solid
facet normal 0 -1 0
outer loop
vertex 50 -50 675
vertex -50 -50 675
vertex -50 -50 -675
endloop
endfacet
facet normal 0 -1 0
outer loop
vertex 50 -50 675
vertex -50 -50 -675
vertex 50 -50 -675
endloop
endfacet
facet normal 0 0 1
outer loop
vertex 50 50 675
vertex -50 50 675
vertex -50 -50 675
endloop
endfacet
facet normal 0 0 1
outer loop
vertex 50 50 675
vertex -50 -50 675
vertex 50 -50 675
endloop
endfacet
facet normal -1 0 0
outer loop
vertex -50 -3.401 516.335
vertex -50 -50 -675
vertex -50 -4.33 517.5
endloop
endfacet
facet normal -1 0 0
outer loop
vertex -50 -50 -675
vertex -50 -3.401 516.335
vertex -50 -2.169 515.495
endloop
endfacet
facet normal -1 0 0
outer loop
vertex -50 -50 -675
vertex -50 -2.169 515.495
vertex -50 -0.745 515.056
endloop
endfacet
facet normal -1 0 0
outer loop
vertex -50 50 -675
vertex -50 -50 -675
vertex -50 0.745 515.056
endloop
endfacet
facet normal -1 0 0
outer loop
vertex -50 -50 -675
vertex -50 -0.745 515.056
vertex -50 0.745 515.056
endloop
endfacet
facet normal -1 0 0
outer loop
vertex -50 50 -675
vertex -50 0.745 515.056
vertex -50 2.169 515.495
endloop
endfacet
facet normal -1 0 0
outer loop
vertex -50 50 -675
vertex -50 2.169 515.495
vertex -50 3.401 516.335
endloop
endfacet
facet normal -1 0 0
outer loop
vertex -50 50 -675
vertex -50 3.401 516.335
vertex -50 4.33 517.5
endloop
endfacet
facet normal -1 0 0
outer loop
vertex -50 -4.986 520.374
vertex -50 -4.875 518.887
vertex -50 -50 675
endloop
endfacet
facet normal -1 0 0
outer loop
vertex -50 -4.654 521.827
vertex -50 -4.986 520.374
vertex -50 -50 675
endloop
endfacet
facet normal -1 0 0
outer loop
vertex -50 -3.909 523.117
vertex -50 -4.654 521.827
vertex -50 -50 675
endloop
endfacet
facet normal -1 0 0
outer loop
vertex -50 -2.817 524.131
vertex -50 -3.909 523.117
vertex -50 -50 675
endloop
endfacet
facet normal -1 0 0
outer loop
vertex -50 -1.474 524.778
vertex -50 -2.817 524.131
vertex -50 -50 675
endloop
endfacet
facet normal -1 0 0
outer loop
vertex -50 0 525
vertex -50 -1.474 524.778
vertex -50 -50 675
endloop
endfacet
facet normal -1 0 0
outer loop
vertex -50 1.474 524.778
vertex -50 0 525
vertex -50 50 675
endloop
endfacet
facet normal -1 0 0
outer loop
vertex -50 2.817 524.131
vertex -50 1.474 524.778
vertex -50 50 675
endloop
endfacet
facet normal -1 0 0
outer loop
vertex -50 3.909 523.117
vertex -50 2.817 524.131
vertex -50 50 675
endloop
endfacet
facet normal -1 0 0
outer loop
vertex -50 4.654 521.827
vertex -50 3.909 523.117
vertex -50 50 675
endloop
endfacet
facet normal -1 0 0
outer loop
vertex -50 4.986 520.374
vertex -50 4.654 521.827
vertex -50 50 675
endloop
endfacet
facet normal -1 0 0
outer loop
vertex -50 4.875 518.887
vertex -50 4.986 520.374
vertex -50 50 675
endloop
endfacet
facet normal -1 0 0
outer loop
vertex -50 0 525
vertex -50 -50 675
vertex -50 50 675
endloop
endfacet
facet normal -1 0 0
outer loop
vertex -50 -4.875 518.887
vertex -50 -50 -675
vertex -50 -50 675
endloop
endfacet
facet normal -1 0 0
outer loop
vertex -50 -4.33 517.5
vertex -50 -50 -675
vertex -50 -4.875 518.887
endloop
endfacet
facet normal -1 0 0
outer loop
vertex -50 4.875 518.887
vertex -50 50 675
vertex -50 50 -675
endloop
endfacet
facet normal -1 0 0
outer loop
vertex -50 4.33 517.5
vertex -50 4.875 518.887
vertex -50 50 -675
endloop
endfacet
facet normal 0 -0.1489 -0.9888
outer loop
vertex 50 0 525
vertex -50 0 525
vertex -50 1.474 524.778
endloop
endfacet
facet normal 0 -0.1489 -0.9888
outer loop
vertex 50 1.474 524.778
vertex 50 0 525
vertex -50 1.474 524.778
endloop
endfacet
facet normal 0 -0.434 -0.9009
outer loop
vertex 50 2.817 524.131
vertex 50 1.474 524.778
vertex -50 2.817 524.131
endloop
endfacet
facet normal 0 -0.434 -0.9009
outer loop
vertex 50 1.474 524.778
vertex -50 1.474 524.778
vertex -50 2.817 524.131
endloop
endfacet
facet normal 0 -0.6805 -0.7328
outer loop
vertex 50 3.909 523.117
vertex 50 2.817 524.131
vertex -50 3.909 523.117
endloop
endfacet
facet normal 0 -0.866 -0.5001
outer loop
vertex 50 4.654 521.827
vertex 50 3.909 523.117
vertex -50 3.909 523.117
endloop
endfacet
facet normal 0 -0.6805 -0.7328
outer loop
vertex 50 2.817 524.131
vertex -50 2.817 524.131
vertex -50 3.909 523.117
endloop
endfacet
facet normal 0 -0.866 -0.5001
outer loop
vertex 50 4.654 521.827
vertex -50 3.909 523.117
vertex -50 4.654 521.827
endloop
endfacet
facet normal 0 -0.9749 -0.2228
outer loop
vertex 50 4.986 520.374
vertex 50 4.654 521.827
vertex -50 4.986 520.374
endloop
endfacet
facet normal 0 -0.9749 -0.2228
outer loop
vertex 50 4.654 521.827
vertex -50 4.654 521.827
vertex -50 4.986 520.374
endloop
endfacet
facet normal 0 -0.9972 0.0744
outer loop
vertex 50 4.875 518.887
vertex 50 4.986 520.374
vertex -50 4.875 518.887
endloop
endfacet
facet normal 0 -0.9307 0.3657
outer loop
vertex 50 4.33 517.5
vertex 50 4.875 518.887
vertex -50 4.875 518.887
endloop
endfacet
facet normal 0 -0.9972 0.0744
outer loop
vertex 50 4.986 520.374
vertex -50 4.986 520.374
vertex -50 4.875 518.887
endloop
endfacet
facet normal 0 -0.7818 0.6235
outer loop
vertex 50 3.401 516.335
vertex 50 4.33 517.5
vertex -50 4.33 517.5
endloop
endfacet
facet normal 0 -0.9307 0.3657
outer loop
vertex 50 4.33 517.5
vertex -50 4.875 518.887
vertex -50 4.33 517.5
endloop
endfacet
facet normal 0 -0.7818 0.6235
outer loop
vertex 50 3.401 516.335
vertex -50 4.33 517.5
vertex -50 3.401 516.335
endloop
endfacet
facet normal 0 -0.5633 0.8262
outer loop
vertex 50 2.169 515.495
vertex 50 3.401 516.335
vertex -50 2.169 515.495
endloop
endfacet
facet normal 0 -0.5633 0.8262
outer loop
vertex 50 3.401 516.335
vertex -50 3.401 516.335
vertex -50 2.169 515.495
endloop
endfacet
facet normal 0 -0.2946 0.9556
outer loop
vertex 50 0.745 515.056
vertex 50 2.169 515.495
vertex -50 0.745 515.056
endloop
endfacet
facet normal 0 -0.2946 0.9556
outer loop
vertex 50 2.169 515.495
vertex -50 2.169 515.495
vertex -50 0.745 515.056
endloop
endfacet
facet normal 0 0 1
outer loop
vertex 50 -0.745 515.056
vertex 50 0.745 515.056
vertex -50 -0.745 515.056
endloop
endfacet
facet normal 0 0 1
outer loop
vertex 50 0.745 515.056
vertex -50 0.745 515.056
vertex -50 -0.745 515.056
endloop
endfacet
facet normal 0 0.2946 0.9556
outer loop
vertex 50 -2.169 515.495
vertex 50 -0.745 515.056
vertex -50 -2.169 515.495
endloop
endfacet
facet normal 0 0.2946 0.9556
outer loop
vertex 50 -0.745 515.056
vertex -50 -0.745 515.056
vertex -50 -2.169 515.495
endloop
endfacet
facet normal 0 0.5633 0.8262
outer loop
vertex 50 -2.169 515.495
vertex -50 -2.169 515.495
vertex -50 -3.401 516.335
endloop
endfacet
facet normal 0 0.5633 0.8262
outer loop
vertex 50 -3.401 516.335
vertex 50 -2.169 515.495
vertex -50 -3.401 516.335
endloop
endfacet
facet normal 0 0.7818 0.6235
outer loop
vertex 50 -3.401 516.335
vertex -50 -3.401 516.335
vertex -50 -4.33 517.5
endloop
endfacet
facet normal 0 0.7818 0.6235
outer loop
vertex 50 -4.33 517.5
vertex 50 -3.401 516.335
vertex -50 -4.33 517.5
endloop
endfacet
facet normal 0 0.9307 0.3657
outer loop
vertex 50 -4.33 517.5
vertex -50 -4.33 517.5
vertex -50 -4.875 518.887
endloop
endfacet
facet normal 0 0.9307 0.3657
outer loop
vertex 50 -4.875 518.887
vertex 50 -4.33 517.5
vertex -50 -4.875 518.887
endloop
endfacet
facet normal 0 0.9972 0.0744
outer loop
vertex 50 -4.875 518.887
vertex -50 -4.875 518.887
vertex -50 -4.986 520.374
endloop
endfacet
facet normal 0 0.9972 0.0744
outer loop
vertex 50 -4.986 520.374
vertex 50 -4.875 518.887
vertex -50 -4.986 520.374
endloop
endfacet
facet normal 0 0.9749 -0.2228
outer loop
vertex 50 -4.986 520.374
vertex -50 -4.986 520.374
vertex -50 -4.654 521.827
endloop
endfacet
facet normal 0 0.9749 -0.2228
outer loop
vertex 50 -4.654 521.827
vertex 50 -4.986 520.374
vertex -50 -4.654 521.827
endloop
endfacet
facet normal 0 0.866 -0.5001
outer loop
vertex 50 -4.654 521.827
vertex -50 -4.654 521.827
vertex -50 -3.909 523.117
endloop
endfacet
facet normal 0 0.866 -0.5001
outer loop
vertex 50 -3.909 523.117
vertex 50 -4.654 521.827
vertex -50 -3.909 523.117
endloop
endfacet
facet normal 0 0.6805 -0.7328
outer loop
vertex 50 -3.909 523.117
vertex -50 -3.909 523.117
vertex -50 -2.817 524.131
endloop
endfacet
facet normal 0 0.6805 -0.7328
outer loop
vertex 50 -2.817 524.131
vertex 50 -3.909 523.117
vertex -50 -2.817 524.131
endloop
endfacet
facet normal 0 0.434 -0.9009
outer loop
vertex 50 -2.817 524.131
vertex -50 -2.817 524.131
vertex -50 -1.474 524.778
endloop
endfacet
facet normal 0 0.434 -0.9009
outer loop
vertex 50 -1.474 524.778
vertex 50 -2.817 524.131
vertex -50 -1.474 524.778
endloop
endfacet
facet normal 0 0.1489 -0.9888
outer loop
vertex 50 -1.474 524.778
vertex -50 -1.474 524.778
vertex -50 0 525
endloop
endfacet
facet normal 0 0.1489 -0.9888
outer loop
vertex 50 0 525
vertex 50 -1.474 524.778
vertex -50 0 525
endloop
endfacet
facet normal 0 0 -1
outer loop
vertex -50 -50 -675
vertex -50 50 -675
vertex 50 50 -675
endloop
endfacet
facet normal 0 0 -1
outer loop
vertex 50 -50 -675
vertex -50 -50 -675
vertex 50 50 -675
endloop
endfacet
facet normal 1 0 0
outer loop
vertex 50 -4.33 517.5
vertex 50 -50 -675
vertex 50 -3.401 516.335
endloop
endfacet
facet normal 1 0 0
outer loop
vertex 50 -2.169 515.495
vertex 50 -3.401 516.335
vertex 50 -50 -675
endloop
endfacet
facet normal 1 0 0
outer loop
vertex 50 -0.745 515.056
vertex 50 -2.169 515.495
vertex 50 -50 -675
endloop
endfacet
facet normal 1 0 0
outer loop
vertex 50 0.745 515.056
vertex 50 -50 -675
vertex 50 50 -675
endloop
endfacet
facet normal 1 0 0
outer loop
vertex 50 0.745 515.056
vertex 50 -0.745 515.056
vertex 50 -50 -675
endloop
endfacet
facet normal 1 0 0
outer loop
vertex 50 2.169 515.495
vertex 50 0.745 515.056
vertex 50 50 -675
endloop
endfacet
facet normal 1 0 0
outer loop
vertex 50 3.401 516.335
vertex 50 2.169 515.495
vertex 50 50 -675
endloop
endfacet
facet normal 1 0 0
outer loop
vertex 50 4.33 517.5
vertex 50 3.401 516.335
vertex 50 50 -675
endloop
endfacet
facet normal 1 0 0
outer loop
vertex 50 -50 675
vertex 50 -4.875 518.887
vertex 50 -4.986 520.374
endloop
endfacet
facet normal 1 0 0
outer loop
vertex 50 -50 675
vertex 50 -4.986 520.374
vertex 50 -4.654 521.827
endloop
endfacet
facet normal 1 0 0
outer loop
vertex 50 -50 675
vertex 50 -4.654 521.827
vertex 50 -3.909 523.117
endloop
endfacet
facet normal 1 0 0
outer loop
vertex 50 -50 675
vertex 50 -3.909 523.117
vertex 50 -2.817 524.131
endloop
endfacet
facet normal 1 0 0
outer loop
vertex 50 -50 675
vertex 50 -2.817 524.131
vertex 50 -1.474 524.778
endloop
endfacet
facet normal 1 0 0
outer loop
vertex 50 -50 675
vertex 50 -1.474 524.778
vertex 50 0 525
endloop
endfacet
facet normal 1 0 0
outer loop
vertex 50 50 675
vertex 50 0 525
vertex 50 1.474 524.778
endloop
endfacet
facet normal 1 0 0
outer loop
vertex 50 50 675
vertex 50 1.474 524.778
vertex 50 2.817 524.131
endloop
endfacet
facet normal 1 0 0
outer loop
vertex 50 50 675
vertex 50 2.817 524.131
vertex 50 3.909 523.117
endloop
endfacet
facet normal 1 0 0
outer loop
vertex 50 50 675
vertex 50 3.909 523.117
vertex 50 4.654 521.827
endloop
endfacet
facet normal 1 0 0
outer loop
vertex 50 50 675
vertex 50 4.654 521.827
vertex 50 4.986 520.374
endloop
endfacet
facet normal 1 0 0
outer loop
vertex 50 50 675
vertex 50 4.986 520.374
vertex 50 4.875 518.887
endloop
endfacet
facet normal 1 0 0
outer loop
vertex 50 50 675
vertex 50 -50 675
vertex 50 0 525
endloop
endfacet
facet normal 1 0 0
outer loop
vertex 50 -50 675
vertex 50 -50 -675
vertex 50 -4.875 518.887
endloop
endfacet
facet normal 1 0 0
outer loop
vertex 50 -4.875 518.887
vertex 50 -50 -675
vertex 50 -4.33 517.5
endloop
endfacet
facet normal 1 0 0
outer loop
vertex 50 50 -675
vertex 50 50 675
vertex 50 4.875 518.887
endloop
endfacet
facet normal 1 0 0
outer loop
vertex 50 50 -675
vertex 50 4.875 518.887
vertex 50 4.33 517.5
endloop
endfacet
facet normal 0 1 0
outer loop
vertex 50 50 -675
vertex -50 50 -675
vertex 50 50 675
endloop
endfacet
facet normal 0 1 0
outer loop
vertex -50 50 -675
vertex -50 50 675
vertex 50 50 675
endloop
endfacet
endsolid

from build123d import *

# Parameters (mm, degrees)
SKETCH1_W           = 100
SKETCH1_H           = 100
BOSS_EXTRUDE1_DEPTH = 675
SKETCH2_R           = 5
CUT_EXTRUDE1_DEPTH  = 685.19660917


with BuildPart() as part:
    # Sketch1 → Boss-Extrude1 (new, symmetric)
    with BuildSketch(Plane.XY):
        Rectangle(SKETCH1_W, SKETCH1_H)
    extrude(amount=BOSS_EXTRUDE1_DEPTH, both=True)

    # Sketch2 → Cut-Extrude1 (cut, through all)
    with BuildSketch(Plane.ZY.offset(50)):
        with Locations((520, 0)):
            Circle(SKETCH2_R)
    extrude(amount=-CUT_EXTRUDE1_DEPTH, mode=Mode.SUBTRACT)


solid = part.part
